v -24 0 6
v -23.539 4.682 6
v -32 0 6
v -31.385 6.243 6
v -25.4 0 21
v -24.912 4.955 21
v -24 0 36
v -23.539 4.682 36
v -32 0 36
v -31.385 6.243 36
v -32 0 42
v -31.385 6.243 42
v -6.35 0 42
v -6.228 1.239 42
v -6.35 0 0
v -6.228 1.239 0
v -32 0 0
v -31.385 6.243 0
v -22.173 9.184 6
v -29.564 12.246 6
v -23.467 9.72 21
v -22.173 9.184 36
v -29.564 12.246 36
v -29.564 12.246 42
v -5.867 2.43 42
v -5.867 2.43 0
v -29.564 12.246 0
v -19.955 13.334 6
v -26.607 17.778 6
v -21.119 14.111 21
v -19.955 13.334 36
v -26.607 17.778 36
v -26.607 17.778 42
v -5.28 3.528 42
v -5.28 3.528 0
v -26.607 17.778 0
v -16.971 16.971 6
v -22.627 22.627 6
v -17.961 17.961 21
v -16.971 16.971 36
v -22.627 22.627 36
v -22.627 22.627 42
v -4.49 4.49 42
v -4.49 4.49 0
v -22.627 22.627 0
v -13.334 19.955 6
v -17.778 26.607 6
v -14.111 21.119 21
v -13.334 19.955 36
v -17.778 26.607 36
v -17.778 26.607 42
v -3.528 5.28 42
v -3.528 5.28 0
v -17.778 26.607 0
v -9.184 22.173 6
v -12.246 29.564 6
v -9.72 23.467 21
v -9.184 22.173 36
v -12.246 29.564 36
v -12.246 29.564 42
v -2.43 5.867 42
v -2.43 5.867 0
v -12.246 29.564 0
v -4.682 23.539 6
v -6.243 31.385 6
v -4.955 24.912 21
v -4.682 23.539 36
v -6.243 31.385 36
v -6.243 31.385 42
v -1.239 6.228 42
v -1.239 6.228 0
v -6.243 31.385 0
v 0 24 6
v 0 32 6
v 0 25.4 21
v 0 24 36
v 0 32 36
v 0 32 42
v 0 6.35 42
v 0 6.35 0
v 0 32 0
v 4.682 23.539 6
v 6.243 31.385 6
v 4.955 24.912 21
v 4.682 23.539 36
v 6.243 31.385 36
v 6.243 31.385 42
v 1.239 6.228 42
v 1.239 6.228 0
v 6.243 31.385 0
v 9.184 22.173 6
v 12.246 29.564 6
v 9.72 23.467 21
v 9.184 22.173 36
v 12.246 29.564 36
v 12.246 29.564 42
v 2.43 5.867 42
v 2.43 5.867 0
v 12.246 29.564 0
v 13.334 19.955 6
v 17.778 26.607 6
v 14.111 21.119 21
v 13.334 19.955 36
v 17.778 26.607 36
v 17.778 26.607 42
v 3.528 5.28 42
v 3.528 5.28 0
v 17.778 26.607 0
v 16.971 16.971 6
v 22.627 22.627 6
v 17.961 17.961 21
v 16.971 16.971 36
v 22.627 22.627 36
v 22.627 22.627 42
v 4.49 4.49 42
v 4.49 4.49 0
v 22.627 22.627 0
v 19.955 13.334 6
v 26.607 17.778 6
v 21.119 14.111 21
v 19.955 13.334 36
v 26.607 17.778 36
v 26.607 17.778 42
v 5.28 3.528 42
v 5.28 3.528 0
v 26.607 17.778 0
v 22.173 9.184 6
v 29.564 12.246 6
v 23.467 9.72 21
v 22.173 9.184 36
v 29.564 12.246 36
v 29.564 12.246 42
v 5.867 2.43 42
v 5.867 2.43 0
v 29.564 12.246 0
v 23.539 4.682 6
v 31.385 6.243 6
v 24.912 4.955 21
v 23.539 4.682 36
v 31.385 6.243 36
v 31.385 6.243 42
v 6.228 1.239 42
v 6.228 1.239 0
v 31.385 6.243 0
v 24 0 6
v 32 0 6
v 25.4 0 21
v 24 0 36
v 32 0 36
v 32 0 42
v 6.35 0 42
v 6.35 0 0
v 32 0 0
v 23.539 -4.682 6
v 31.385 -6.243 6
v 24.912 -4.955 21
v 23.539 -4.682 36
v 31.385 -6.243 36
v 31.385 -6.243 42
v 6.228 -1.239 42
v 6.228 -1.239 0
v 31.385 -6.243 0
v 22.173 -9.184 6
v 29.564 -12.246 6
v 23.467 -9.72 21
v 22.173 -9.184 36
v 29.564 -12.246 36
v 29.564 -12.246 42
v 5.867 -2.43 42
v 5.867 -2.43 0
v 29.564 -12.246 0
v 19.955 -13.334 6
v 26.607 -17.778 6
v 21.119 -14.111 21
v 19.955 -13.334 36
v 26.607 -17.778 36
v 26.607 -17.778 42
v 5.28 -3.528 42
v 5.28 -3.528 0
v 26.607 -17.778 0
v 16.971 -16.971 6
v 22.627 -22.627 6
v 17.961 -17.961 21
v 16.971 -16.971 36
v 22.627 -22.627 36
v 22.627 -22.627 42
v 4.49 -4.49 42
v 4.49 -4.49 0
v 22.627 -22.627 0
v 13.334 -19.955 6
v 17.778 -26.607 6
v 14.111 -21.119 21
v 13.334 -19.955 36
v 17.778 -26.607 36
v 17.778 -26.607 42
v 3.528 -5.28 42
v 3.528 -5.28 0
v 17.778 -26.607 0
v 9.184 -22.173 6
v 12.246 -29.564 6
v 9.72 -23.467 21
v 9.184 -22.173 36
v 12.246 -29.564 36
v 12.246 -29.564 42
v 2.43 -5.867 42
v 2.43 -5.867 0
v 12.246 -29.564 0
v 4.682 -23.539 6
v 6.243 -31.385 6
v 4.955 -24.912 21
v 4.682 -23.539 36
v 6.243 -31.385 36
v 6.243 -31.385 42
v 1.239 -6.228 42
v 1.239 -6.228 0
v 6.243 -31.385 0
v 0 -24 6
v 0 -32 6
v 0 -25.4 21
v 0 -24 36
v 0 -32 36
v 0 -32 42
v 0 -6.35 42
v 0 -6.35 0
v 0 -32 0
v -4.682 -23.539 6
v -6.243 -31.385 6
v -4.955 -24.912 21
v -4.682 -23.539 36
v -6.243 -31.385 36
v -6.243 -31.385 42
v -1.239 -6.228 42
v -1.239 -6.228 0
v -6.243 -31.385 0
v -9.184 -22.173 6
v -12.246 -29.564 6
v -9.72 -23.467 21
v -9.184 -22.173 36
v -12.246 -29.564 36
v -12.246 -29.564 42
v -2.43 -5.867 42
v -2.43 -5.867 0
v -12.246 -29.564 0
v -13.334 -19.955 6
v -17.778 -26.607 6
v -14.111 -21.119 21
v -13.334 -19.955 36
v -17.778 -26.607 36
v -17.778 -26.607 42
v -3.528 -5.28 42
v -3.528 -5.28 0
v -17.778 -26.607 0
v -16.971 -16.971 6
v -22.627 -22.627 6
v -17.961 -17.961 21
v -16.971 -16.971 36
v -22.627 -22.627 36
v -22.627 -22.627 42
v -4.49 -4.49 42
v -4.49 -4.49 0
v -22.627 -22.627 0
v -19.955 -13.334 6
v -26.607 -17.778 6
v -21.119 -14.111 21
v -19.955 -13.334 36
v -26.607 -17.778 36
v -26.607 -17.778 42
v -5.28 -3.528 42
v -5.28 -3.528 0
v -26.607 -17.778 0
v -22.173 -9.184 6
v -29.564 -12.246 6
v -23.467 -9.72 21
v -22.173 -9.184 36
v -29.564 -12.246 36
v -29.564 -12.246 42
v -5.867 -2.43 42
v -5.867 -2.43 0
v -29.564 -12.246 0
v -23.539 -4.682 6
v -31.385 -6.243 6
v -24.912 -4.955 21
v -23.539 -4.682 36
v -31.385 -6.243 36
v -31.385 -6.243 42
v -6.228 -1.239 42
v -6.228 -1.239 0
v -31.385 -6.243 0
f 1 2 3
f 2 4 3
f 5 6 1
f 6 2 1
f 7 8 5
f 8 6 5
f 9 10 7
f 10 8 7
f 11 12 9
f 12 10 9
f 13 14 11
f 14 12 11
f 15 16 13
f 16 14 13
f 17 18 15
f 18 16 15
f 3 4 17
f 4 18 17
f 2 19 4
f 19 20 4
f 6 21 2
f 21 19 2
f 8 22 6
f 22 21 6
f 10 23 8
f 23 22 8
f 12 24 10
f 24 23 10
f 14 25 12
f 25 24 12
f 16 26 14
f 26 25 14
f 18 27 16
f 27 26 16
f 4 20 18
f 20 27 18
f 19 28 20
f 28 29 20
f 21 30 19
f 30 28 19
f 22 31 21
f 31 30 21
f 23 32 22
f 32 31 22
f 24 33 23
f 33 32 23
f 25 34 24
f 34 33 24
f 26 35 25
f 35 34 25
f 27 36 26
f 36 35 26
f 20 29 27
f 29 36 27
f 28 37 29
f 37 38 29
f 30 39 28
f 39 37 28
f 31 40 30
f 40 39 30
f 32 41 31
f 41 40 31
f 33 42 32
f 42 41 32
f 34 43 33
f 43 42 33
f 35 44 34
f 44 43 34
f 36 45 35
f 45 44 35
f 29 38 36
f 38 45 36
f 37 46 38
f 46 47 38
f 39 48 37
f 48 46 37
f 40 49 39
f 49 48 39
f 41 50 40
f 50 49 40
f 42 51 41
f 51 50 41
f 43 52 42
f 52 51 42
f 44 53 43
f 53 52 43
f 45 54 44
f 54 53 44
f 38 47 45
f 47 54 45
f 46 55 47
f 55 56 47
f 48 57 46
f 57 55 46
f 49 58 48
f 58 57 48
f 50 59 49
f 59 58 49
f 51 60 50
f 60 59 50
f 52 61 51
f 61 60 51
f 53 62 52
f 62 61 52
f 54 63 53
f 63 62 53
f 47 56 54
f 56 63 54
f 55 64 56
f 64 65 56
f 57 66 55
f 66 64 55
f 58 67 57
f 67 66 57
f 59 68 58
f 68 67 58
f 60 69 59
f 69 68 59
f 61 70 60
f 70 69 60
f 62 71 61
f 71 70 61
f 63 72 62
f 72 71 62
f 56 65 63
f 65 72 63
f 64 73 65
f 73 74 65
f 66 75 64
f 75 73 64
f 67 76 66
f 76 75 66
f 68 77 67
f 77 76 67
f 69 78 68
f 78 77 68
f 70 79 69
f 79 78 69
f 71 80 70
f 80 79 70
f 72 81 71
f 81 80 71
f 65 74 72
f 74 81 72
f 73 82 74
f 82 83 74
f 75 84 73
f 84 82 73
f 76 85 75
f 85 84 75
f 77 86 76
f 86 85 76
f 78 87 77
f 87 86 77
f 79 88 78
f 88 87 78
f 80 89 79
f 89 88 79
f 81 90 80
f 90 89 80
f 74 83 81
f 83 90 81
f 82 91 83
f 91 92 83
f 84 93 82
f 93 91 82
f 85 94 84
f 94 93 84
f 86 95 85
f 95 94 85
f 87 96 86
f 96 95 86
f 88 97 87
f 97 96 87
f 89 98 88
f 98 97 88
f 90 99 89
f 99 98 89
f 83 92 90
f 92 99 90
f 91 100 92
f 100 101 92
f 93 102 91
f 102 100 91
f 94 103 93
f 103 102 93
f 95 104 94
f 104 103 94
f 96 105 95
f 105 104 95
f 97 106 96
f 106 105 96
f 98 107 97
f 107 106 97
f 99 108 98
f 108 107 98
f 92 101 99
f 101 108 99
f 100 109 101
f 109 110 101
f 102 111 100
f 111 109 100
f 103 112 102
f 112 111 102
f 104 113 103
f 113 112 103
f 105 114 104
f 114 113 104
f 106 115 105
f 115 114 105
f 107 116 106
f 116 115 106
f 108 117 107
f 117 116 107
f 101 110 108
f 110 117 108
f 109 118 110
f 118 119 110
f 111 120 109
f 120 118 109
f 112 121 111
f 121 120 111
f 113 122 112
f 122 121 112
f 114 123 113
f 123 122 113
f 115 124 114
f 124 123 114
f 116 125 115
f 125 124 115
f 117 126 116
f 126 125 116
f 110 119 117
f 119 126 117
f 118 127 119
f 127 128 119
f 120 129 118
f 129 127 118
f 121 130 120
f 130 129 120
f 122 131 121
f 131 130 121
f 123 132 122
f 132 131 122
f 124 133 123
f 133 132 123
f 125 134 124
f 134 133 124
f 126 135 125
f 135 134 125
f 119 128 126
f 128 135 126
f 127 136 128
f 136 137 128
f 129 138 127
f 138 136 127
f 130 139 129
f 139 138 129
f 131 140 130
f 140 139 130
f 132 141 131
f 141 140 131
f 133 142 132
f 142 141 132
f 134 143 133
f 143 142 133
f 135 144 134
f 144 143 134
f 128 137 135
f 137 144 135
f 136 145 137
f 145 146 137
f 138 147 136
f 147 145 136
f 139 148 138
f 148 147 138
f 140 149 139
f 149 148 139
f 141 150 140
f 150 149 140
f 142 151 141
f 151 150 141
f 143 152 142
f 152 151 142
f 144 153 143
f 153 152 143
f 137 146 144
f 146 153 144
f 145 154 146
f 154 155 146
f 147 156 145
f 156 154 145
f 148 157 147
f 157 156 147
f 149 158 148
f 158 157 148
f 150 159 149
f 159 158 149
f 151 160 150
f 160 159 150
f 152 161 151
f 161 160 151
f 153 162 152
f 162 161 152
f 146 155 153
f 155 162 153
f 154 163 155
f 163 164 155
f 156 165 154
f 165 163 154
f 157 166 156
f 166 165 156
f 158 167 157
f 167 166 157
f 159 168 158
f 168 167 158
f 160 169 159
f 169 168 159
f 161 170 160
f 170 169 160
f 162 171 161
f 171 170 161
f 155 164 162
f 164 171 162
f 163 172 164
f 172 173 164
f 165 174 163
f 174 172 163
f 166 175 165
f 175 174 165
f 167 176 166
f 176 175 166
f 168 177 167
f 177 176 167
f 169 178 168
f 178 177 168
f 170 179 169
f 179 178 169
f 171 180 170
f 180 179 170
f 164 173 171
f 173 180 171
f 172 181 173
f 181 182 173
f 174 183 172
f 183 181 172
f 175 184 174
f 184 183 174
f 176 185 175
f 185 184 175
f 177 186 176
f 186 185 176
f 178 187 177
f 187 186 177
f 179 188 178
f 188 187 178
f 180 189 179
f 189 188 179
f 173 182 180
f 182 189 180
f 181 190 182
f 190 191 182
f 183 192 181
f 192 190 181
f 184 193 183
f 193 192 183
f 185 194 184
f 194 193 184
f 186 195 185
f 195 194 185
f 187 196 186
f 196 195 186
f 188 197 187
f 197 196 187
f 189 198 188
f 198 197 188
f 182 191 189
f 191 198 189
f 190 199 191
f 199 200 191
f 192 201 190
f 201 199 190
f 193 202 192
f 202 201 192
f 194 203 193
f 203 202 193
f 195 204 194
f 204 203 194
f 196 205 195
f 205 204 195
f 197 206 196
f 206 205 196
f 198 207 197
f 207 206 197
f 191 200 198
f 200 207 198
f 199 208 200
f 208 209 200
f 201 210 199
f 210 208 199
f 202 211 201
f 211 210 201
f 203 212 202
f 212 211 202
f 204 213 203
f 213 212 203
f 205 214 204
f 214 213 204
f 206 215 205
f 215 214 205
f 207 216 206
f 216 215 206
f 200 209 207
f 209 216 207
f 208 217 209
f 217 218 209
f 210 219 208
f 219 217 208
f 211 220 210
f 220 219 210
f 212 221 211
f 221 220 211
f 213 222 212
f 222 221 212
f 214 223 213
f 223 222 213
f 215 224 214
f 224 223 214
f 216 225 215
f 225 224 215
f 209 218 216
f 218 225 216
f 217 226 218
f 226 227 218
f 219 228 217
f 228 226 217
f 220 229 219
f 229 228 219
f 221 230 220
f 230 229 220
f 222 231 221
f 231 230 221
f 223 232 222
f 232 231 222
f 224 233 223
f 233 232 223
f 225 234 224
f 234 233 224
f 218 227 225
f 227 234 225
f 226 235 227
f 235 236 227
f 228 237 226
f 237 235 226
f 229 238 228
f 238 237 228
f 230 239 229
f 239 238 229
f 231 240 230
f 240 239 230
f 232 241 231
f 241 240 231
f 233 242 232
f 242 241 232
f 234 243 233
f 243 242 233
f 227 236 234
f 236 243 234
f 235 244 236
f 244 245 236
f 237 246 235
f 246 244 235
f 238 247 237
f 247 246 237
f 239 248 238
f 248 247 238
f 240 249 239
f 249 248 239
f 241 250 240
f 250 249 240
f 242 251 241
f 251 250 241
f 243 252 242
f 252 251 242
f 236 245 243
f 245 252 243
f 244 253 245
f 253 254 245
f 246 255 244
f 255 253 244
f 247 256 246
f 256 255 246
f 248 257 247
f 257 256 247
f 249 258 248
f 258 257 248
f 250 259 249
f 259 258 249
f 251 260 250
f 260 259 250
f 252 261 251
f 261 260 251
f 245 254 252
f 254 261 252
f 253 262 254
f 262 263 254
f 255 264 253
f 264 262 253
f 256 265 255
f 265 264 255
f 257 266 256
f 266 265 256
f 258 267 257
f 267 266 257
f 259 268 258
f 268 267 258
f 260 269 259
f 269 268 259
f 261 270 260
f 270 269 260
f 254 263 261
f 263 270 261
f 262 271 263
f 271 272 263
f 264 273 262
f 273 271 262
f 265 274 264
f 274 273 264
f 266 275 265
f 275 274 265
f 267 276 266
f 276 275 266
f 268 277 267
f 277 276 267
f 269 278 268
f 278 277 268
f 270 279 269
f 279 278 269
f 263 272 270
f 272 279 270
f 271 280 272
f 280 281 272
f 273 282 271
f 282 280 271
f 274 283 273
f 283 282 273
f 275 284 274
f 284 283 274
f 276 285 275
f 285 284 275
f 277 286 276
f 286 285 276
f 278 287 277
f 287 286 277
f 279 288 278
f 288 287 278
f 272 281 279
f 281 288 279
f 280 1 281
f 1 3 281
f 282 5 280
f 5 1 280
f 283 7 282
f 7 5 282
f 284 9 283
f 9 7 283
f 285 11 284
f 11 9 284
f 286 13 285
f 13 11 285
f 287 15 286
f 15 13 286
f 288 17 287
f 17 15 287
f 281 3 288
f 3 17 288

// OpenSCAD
$fn = 32;

// ----------------------------------------------------------------------
// Belt roller: 48 mm barrel, 42 mm wide, bore 12.7 mm
// ----------------------------------------------------------------------

// --- parameters (mm) ---
bore_d = 12.7;            // bore
barrel_d = 48;            // barrel diameter
roller_w = 42;            // roller width
flange_d = 64;            // flange diameter
flange_t = 6;             // flange thickness
hub_d = 36.7;             // hub diameter

roller_profile = [[6.35, 0], [32, 0], [32, 6], [24, 6], [25.4, 21], [24, 36], [32, 36], [32, 42], [6.35, 42]];

/* the profile stays clear of the axis, so the bore comes out of the revolve */
rotate_extrude() polygon(roller_profile);
